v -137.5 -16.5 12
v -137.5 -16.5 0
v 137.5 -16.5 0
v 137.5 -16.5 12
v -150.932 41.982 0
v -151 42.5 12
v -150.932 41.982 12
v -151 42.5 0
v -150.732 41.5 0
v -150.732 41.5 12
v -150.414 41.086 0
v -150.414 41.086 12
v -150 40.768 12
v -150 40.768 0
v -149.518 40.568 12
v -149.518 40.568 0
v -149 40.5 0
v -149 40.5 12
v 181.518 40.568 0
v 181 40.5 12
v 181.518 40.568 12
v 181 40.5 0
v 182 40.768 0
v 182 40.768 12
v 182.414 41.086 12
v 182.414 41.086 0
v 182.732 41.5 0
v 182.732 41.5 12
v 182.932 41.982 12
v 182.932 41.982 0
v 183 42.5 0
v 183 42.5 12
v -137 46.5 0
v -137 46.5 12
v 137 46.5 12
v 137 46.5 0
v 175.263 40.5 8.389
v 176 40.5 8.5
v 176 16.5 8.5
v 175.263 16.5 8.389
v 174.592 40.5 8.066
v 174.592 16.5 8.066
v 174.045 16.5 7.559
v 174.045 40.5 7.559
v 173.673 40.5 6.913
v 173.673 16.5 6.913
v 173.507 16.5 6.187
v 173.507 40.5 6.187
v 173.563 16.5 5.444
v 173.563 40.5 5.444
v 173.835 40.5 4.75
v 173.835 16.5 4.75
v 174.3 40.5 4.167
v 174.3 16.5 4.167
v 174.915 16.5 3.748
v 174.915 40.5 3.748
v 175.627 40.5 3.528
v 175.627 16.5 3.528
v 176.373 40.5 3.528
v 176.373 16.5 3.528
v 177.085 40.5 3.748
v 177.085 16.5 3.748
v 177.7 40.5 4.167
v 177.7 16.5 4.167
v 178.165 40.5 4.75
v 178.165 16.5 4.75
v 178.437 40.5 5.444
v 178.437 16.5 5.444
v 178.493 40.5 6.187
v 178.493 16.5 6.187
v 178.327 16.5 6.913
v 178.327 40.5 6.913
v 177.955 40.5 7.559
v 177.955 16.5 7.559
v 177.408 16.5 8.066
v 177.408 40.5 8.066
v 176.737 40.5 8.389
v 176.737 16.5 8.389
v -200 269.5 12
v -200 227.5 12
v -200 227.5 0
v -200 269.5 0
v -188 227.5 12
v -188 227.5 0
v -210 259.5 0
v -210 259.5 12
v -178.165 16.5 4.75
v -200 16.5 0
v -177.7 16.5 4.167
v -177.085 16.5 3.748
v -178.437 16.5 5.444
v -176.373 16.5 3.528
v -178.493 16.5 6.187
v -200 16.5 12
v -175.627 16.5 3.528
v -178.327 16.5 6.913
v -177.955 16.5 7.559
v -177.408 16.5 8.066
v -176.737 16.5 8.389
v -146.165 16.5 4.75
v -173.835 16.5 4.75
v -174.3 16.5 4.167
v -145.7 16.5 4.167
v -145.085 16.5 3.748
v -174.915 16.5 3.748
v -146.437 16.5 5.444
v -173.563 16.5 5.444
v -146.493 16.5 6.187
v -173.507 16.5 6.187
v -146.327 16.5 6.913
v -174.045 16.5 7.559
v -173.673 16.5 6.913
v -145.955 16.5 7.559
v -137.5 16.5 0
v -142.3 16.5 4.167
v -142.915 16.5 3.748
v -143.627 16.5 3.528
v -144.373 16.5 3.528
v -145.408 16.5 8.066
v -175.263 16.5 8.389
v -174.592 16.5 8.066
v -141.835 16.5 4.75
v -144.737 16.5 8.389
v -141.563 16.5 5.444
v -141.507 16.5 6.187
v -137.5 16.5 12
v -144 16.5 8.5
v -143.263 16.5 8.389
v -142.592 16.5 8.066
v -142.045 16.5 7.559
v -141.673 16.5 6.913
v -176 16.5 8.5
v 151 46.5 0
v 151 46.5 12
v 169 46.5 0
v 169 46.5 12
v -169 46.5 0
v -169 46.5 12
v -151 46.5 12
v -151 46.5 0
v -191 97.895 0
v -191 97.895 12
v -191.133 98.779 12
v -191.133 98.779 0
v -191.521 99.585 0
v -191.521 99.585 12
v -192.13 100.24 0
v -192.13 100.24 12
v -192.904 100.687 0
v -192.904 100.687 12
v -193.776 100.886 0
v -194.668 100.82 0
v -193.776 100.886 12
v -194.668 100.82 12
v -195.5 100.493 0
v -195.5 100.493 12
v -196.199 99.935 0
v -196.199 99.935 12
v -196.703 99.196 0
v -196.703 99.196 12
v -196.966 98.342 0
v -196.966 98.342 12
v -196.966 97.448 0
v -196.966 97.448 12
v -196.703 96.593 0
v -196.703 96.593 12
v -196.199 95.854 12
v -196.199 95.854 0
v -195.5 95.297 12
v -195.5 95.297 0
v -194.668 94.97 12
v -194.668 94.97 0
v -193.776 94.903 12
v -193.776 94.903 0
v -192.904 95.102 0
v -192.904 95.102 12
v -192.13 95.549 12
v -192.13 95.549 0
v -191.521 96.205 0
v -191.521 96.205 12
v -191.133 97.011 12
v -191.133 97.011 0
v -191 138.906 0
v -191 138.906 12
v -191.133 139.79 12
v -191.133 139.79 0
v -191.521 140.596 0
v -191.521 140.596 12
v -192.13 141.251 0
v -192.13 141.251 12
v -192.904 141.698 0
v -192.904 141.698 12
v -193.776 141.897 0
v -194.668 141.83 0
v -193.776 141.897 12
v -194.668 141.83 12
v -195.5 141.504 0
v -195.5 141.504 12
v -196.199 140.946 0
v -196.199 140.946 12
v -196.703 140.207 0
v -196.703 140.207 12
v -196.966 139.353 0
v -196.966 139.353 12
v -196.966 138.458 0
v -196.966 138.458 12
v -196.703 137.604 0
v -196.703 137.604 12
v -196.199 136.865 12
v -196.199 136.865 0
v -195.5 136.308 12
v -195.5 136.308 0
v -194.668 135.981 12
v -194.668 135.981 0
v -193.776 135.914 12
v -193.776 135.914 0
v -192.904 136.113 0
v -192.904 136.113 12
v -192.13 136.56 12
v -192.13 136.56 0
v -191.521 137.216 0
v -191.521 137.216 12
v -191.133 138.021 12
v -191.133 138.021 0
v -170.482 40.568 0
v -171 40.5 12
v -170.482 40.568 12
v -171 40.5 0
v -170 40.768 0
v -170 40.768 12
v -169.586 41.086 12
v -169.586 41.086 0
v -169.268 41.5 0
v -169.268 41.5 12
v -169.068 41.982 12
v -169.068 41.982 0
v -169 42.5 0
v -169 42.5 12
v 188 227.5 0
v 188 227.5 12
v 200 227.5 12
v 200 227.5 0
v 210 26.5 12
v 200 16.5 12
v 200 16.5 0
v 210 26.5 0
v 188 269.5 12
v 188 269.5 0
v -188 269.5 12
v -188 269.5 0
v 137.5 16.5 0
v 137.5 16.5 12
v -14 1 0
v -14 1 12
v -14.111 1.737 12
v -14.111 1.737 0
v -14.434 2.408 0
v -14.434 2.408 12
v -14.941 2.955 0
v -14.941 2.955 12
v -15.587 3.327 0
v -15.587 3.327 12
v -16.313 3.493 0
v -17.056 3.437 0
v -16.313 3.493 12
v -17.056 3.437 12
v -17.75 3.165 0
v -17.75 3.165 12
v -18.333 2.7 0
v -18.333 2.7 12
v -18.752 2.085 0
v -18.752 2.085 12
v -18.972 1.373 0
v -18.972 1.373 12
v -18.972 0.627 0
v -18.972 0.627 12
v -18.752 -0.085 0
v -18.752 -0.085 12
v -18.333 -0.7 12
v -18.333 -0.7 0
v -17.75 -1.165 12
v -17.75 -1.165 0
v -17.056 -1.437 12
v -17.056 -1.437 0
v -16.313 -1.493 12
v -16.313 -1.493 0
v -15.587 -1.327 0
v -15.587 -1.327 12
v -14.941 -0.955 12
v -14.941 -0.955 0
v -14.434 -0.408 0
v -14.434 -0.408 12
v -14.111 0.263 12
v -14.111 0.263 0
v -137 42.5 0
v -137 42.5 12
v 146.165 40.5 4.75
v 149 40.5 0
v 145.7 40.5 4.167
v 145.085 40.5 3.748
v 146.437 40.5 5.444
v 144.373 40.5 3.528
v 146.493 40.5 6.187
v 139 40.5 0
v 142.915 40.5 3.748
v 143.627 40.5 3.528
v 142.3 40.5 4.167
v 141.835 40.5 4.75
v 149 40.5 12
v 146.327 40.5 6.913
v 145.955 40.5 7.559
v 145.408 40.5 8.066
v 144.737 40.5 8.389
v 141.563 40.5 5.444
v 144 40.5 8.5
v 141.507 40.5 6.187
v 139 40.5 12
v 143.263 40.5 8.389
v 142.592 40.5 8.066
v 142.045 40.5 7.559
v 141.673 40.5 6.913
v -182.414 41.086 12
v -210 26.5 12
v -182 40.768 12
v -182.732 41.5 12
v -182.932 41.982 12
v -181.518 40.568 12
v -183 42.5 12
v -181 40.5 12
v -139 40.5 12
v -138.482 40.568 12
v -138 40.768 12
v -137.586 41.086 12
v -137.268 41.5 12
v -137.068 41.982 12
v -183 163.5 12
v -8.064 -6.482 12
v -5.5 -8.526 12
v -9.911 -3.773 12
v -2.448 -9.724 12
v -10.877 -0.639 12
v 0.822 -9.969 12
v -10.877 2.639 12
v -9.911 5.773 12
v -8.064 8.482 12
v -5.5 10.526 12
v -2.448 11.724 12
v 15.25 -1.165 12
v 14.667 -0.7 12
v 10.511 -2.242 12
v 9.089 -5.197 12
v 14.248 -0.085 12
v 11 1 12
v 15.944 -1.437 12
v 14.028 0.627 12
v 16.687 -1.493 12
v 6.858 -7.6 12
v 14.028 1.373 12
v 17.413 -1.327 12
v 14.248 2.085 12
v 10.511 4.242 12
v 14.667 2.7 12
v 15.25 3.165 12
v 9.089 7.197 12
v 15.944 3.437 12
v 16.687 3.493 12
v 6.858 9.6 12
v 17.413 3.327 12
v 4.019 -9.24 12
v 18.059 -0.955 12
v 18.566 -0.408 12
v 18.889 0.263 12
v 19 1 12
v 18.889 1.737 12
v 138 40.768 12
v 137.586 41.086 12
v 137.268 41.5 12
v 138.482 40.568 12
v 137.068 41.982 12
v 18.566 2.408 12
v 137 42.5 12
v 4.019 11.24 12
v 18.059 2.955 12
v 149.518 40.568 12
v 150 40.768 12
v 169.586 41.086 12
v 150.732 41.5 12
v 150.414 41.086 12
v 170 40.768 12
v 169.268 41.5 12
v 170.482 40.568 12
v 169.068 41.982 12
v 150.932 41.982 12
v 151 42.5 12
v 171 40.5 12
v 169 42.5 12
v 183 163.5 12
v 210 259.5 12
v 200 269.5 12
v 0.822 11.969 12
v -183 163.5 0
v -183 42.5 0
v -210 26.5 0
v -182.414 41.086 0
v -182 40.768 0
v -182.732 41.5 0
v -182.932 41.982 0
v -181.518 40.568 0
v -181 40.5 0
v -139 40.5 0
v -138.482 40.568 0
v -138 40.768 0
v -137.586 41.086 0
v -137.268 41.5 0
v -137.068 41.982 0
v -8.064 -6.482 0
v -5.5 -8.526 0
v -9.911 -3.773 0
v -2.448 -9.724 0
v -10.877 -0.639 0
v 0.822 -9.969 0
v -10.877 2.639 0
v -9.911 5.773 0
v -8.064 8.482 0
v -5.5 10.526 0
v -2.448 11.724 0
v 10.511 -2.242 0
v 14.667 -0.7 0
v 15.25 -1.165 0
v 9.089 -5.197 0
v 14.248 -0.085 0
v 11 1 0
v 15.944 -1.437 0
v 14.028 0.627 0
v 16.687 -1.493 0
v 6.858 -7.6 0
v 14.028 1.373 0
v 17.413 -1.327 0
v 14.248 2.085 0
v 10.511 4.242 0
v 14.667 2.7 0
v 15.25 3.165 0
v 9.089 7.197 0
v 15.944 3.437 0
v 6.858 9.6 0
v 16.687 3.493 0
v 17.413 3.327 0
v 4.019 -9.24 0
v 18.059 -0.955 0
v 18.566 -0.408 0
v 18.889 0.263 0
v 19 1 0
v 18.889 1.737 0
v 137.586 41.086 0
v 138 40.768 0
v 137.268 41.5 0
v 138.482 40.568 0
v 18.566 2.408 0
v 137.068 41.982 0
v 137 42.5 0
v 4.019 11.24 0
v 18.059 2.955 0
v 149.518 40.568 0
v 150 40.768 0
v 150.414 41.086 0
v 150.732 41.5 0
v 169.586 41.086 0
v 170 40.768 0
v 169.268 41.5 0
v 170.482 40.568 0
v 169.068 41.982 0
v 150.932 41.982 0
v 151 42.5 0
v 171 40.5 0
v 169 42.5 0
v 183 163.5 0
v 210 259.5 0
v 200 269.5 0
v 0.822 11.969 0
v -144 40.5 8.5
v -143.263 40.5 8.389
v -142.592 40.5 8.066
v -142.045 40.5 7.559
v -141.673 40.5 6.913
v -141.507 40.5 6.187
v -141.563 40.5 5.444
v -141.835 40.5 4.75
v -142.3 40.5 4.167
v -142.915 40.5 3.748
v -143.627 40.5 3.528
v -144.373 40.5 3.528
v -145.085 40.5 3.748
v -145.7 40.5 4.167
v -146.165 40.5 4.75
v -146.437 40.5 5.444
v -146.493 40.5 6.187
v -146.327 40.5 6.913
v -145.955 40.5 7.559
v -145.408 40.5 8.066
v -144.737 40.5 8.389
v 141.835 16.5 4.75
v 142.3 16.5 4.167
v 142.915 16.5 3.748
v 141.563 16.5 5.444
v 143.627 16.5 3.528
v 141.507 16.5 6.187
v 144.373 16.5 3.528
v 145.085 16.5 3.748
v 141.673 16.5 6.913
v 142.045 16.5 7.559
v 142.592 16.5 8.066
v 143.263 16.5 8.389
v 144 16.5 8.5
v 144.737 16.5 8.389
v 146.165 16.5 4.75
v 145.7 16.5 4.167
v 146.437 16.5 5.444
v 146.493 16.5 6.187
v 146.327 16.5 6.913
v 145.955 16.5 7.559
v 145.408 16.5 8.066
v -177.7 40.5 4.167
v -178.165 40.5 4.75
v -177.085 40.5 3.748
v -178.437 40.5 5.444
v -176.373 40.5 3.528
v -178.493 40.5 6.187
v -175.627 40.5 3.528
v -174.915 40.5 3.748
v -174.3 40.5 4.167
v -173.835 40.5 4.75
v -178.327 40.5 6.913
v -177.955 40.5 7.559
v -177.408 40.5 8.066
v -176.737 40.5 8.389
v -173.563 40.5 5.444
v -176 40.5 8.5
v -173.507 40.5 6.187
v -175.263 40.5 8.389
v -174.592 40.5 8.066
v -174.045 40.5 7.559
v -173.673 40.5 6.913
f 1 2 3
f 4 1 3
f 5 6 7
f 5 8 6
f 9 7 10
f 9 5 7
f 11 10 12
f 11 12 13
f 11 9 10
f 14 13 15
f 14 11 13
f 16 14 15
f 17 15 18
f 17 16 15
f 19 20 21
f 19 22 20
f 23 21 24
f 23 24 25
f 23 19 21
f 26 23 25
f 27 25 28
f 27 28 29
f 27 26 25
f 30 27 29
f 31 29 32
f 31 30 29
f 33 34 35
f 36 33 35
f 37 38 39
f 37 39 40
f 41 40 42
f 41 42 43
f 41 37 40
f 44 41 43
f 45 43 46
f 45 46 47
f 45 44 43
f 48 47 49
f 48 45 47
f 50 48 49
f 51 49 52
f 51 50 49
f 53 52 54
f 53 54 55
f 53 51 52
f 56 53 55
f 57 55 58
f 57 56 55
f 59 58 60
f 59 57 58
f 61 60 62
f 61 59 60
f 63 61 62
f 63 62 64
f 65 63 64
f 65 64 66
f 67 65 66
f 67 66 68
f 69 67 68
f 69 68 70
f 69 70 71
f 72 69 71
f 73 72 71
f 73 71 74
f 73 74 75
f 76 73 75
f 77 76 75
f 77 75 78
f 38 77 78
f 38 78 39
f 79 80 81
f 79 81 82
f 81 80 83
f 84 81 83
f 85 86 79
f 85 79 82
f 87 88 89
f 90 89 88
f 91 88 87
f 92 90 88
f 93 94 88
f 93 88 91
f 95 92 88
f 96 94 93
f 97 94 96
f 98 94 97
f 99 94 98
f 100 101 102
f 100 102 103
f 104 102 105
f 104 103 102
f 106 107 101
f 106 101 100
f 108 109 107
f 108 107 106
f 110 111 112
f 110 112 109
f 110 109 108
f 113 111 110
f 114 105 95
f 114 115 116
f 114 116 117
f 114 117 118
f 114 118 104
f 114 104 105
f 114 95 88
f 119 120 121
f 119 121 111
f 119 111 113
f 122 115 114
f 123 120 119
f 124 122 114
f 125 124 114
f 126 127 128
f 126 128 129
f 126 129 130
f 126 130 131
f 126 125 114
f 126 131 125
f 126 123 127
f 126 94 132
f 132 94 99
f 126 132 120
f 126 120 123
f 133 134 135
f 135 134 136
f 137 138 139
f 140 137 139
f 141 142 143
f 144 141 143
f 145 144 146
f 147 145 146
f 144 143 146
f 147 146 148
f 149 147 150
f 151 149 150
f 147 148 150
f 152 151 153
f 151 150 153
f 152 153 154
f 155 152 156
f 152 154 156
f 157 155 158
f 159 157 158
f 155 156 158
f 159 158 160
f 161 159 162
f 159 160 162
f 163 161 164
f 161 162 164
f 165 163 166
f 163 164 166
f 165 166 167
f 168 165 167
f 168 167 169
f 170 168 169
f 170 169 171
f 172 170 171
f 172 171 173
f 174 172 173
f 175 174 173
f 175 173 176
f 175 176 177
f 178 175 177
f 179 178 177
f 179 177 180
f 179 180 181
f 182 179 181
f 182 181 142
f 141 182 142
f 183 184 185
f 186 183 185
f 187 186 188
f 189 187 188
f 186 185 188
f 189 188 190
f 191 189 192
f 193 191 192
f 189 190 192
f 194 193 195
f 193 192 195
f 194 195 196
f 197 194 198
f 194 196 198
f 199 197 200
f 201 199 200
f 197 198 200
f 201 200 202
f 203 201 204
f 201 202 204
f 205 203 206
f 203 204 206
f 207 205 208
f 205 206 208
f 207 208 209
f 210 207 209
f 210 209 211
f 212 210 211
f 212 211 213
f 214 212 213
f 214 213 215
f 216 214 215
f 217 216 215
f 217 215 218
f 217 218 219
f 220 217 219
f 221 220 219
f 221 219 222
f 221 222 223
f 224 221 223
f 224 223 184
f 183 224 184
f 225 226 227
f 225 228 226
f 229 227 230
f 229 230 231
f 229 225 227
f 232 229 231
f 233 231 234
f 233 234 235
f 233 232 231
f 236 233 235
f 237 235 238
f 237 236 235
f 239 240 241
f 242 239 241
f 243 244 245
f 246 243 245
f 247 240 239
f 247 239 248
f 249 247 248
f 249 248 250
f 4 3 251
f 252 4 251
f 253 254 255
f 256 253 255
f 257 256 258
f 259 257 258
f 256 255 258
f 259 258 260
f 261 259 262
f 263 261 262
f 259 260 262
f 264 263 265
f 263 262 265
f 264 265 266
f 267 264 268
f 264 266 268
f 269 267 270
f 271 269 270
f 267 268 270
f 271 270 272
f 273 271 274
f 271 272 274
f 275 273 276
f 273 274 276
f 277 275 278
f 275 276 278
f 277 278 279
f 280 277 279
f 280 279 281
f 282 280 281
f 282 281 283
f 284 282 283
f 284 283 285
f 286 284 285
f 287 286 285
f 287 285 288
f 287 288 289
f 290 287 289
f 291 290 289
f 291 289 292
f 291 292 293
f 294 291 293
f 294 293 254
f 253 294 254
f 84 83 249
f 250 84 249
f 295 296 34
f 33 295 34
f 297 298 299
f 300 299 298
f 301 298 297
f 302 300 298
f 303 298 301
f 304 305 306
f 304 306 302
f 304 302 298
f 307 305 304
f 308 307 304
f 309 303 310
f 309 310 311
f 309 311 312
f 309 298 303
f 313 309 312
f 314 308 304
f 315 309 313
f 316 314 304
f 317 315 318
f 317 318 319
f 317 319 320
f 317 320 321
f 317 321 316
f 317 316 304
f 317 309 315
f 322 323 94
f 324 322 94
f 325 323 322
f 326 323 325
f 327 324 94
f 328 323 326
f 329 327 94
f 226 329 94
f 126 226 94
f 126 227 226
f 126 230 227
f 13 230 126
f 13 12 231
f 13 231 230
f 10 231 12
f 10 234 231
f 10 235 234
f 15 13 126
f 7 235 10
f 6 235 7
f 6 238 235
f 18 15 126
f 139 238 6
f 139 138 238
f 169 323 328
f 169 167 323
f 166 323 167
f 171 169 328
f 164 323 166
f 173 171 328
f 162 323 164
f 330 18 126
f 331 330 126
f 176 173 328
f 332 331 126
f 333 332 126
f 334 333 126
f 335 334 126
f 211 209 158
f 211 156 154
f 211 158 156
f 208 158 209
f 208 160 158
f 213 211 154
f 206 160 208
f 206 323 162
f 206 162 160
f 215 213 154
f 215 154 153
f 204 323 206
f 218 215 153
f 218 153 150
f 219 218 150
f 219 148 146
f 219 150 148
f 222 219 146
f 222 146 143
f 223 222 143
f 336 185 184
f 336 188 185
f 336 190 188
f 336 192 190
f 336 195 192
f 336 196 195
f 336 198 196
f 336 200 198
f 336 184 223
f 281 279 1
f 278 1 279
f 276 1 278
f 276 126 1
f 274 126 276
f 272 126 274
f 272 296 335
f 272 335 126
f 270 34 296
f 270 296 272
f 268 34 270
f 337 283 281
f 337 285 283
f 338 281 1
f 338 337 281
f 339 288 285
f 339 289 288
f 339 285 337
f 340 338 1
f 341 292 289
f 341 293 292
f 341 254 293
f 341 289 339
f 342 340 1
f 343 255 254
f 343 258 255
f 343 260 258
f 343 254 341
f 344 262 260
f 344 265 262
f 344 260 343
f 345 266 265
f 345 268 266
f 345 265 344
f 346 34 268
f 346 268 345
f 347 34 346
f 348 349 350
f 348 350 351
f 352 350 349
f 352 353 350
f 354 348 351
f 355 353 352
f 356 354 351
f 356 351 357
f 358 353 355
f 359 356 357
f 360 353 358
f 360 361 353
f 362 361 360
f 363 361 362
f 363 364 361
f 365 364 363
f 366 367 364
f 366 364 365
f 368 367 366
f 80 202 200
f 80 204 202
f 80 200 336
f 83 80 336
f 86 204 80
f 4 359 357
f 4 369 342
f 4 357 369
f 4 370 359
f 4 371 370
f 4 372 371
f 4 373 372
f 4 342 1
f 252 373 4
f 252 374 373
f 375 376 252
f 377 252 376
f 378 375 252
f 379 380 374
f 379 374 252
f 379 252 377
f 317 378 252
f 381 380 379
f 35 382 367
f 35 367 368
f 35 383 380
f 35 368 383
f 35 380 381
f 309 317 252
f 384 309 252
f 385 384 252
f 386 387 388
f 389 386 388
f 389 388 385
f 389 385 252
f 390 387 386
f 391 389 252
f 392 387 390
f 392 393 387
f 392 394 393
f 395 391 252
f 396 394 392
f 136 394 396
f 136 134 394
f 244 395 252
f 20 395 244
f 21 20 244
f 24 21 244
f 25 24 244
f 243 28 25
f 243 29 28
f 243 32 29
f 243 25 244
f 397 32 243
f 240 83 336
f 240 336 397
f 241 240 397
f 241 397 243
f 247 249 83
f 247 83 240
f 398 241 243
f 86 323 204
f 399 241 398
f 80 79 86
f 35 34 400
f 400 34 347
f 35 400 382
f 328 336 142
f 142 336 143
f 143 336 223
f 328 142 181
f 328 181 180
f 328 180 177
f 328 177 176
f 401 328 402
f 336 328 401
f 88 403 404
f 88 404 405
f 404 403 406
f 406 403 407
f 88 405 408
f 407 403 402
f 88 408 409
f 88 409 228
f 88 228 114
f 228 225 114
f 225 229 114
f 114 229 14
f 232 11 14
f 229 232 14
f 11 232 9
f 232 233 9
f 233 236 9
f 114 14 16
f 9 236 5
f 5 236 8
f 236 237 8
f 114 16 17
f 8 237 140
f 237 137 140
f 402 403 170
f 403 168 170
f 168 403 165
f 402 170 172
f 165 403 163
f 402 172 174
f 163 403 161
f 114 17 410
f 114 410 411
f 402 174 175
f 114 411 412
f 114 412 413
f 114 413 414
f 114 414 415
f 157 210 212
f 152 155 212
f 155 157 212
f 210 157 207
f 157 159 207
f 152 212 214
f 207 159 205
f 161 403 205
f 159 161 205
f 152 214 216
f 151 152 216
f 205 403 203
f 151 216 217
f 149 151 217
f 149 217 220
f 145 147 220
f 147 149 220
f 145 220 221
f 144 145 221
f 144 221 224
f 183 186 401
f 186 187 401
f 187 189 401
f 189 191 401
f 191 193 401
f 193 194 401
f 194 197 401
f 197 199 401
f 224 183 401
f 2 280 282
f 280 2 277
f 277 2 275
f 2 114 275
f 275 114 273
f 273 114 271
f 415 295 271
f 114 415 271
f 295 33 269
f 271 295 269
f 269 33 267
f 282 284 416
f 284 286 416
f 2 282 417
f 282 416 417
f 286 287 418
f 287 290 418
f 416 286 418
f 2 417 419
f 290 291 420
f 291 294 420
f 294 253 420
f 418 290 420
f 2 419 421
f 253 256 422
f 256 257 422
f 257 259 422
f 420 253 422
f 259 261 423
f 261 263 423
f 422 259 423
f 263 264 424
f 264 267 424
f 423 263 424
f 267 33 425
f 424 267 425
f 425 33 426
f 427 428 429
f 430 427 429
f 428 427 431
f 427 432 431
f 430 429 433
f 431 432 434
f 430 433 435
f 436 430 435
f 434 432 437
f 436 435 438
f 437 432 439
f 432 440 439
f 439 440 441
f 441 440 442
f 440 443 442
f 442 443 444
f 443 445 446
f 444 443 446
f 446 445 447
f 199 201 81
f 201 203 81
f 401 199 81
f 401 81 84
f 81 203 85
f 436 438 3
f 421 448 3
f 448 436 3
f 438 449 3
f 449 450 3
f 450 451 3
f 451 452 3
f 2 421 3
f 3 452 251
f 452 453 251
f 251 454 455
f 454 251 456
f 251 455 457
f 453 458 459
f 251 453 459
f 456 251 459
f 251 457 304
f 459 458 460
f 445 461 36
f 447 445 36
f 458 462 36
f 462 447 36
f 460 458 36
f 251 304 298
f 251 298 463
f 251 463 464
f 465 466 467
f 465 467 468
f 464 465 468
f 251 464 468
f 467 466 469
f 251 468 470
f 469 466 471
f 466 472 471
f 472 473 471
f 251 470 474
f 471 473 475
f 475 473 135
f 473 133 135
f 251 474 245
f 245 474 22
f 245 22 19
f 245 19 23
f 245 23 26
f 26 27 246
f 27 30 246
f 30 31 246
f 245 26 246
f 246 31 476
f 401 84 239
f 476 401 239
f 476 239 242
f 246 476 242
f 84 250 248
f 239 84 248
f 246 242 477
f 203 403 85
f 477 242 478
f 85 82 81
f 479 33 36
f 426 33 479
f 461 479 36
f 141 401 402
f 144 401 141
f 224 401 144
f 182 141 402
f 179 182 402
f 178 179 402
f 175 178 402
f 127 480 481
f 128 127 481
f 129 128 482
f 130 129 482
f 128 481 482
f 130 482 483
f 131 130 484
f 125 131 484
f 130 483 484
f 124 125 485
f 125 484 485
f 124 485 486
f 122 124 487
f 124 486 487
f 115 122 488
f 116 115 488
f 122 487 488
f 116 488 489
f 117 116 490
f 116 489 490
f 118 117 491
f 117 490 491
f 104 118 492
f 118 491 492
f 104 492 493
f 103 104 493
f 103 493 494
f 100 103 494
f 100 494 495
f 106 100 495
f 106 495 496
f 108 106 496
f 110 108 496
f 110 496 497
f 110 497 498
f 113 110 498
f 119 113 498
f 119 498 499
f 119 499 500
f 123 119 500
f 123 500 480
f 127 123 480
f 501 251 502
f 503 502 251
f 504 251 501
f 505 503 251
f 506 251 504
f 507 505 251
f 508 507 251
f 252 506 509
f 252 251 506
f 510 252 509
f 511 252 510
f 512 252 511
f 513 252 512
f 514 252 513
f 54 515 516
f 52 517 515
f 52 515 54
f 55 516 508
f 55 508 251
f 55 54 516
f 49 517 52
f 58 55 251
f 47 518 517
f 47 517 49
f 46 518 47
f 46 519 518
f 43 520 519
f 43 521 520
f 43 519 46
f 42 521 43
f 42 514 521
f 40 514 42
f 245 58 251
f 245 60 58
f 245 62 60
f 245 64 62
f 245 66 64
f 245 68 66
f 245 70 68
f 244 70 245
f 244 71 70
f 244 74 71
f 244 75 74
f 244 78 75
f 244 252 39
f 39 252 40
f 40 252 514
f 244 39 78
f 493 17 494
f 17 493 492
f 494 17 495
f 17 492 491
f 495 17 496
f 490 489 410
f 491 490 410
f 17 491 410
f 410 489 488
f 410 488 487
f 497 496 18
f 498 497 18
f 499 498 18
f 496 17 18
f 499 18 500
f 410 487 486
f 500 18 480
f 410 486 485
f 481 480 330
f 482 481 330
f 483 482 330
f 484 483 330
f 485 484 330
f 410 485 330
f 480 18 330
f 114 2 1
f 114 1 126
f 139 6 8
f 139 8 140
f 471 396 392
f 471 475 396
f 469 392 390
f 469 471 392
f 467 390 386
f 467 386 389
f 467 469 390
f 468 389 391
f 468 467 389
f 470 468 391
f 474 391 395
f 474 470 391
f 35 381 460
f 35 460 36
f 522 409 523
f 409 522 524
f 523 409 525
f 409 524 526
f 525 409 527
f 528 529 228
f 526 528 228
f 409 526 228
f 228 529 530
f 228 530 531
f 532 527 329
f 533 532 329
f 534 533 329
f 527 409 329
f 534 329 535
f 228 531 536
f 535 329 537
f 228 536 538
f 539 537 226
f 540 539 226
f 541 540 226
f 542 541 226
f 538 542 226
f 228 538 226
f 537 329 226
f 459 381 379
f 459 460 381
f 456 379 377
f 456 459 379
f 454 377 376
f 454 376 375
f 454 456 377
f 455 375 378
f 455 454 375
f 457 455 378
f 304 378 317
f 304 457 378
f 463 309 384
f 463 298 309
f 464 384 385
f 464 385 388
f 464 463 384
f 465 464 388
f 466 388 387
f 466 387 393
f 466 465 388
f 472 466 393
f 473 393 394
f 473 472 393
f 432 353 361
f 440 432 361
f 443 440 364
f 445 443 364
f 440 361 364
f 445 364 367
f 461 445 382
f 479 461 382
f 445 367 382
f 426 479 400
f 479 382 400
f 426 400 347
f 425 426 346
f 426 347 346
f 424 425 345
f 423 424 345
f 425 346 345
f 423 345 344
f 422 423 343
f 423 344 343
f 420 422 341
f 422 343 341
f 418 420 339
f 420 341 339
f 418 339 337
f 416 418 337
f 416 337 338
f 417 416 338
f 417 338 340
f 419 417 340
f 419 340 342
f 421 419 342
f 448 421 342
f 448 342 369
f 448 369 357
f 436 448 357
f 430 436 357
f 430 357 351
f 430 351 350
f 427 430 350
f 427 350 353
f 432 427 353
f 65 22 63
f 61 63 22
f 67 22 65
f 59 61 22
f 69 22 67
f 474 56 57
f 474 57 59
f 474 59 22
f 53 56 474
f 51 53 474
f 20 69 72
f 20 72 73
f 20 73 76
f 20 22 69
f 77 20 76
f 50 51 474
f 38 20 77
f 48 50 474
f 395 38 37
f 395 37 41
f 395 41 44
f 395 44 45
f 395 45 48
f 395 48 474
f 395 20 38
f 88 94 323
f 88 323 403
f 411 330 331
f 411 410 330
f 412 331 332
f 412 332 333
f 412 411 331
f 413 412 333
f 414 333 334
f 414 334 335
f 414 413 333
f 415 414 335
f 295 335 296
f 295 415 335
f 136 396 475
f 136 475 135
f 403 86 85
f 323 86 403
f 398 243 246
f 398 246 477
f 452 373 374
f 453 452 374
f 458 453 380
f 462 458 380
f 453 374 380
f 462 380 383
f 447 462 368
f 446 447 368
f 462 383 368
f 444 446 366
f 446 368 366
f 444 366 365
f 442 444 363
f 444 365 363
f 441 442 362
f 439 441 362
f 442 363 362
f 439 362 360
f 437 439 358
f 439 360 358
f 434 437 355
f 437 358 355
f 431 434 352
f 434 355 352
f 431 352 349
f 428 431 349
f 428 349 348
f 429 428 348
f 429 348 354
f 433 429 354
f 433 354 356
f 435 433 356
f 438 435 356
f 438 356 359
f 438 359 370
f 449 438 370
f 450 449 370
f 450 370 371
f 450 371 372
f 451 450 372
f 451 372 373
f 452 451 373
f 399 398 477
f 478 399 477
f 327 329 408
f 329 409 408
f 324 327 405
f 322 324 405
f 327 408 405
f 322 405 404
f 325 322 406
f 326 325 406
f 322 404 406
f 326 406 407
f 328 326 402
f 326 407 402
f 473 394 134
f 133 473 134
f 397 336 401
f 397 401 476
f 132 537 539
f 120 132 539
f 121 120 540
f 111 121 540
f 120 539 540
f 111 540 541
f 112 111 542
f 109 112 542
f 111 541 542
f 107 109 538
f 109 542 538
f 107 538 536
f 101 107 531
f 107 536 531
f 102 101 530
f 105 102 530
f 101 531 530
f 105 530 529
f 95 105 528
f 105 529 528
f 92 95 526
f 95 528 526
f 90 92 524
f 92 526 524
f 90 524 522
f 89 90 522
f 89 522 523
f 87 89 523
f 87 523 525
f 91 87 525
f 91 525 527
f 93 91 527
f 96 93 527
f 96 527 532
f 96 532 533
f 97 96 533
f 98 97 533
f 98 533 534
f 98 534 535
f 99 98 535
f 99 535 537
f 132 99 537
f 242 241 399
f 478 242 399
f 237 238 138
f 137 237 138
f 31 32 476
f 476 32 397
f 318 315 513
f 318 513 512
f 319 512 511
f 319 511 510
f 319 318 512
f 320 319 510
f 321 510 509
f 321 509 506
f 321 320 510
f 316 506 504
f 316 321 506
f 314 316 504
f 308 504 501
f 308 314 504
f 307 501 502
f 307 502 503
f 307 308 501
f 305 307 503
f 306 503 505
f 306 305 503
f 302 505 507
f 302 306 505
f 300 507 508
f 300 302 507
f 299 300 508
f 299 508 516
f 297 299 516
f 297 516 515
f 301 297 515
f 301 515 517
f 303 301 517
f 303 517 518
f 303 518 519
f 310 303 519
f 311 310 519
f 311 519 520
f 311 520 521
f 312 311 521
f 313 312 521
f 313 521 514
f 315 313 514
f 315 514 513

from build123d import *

# Parameters (mm, degrees)
SKETCH1_W            = 275
SKETCH1_H            = 33
BOSS_EXTRUDE1_DEPTH  = 12
CUT_EXTRUDE1_REACH   = 141.005
SKETCH2_R            = 11
SKETCH2_R_2          = 2.5
SKETCH3_W            = 366
SKETCH3_H            = 117
BOSS_EXTRUDE2_DEPTH  = 12
CUT_EXTRUDE2_REACH   = 308.55
SKETCH4_R            = 2.5
CUT_EXTRUDE3_REACH   = 343.869
SKETCH5_W            = 14
SKETCH5_H            = 6
FILLET1_R            = 2
FILLET1_OF_MIRROR2_R = 2
CHAMFER1_SIZE        = 10
CUT_EXTRUDE4_REACH   = 343.869
SKETCH6_R            = 3
CUT_EXTRUDE6_REACH   = 343.869
SKETCH8_W            = 12
SKETCH8_H            = 42
CHAMFER2_SIZE        = 10


with BuildPart() as part:
    # Sketch1 → Boss-Extrude1 (new body)
    with BuildSketch(Plane.XY):
        Rectangle(SKETCH1_W, SKETCH1_H)
    extrude(amount=BOSS_EXTRUDE1_DEPTH)

    # Sketch2 → Cut-Extrude1 (cut, up to next)
    with BuildSketch(Plane.XY.offset(12), mode=Mode.PRIVATE) as cut_extrude1_sk1:
        with Locations((0, 1)):
            Circle(SKETCH2_R)
    cut_extrude1_tool1 = extrude(cut_extrude1_sk1.sketch, amount=-CUT_EXTRUDE1_REACH, mode=Mode.PRIVATE) & part.part
    # Sketch2 → Cut-Extrude1 (cut, up to next)
    with BuildSketch(Plane.XY.offset(12), mode=Mode.PRIVATE) as cut_extrude1_sk2:
        with Locations((-16.5, 1)):
            Circle(SKETCH2_R_2)
    cut_extrude1_tool2 = extrude(cut_extrude1_sk2.sketch, amount=-CUT_EXTRUDE1_REACH, mode=Mode.PRIVATE) & part.part
    # Sketch2 → Cut-Extrude1 (cut, up to next)
    with BuildSketch(Plane.XY.offset(12), mode=Mode.PRIVATE) as cut_extrude1_sk3:
        with Locations((16.5, 1)):
            Circle(SKETCH2_R_2)
    cut_extrude1_tool3 = extrude(cut_extrude1_sk3.sketch, amount=-CUT_EXTRUDE1_REACH, mode=Mode.PRIVATE) & part.part
    add(cut_extrude1_tool1.solids().sort_by_distance((0, 1, 12))[0], mode=Mode.SUBTRACT)
    add(cut_extrude1_tool2.solids().sort_by_distance((-16.5, 1, 12))[0], mode=Mode.SUBTRACT)
    add(cut_extrude1_tool3.solids().sort_by_distance((16.5, 1, 12))[0], mode=Mode.SUBTRACT)

    # Sketch3 → Boss-Extrude2 (add)
    with BuildSketch(Plane.XY.offset(12)):
        Polygon((-210, 16.5), (210, 16.5), (210, 46.5), (210, 269.5), (-210, 269.5), (-210, 46.5), align=None)
        with Locations((0, 105)):
            Rectangle(SKETCH3_W, SKETCH3_H, mode=Mode.SUBTRACT)
    extrude(amount=-BOSS_EXTRUDE2_DEPTH)

    # Sketch4 → Cut-Extrude2 (cut, up to next)
    with BuildSketch(Plane(origin=(0, 46.5, 0), x_dir=(1, 0, 0), z_dir=(0, 1, 0)), mode=Mode.PRIVATE) as cut_extrude2_sk1:
        with Locations(Location((-144, -6, 0), (0, 0, 270))):
            Circle(SKETCH4_R)
    cut_extrude2_tool1 = extrude(cut_extrude2_sk1.sketch, amount=-CUT_EXTRUDE2_REACH, mode=Mode.PRIVATE) & part.part
    # Sketch4 → Cut-Extrude2 (cut, up to next)
    with BuildSketch(Plane(origin=(0, 46.5, 0), x_dir=(1, 0, 0), z_dir=(0, 1, 0)), mode=Mode.PRIVATE) as cut_extrude2_sk2:
        with Locations(Location((-176, -6, 0), (0, 0, 270))):
            Circle(SKETCH4_R)
    cut_extrude2_tool2 = extrude(cut_extrude2_sk2.sketch, amount=-CUT_EXTRUDE2_REACH, mode=Mode.PRIVATE) & part.part
    cut_extrude2_1 = cut_extrude2_tool1.solids().sort_by_distance((-144, 46.5, 6))[0]
    add(cut_extrude2_1, mode=Mode.SUBTRACT)
    cut_extrude2_2 = cut_extrude2_tool2.solids().sort_by_distance((-176, 46.5, 6))[0]
    add(cut_extrude2_2, mode=Mode.SUBTRACT)
    cut_extrude2 = cut_extrude2_1 + cut_extrude2_2  # Cut-Extrude2 as one shape, for the pattern or mirror that repeats it

    # Mirror1: Cut-Extrude2 across plane
    add(cut_extrude2.mirror(Plane(origin=(0, 0, 0), x_dir=(0, 0, 1), z_dir=(1, 0, 0))), mode=Mode.SUBTRACT)

    # Sketch5 → Cut-Extrude3 (cut, up to next)
    with BuildSketch(Plane.XY.offset(12), mode=Mode.PRIVATE) as cut_extrude3_sk1:
        with Locations((-176, 43.5)):
            Rectangle(SKETCH5_W, SKETCH5_H)
    cut_extrude3_tool1 = extrude(cut_extrude3_sk1.sketch, amount=-CUT_EXTRUDE3_REACH, mode=Mode.PRIVATE) & part.part
    # Sketch5 → Cut-Extrude3 (cut, up to next)
    with BuildSketch(Plane.XY.offset(12), mode=Mode.PRIVATE) as cut_extrude3_sk2:
        with Locations((-144, 43.5)):
            Rectangle(SKETCH5_W, SKETCH5_H)
    cut_extrude3_tool2 = extrude(cut_extrude3_sk2.sketch, amount=-CUT_EXTRUDE3_REACH, mode=Mode.PRIVATE) & part.part
    cut_extrude3_1 = cut_extrude3_tool1.solids().sort_by_distance((-176, 43.5, 12))[0]
    add(cut_extrude3_1, mode=Mode.SUBTRACT)
    cut_extrude3_2 = cut_extrude3_tool2.solids().sort_by_distance((-144, 43.5, 12))[0]
    add(cut_extrude3_2, mode=Mode.SUBTRACT)
    cut_extrude3 = cut_extrude3_1 + cut_extrude3_2  # Cut-Extrude3 as one shape, for the pattern or mirror that repeats it

    # Fillet1
    fillet1_edges = [part.edges().sort_by_distance(p)[0] for p in [
        (-169, 40.5, 6),
        (-183, 40.5, 6),
        (-137, 40.5, 6),
        (-151, 40.5, 6),
    ]]
    fillet(fillet1_edges, radius=FILLET1_R)

    # Mirror2: Cut-Extrude3 across plane
    add(cut_extrude3.mirror(Plane(origin=(0, 0, 0), x_dir=(0, 0, 1), z_dir=(1, 0, 0))), mode=Mode.SUBTRACT)

    # Fillet1 of Mirror2
    fillet1_of_mirror2_edges = [part.edges().sort_by_distance(p)[0] for p in [
        (169, 40.5, 6),
        (183, 40.5, 6),
        (137, 40.5, 6),
        (151, 40.5, 6),
    ]]
    fillet(fillet1_of_mirror2_edges, radius=FILLET1_OF_MIRROR2_R)

    # Chamfer1
    chamfer1_edges = [part.edges().sort_by_distance(p)[0] for p in [
        (210, 16.5, 6),
        (-210, 16.5, 6),
    ]]
    chamfer(chamfer1_edges, length=CHAMFER1_SIZE)

    # Sketch6 → Cut-Extrude4 (cut, up to next)
    with BuildSketch(Plane.XY.offset(12), mode=Mode.PRIVATE) as cut_extrude4_sk1:
        with Locations((-194, 138.905602013)):
            Circle(SKETCH6_R)
    cut_extrude4_tool1 = extrude(cut_extrude4_sk1.sketch, amount=-CUT_EXTRUDE4_REACH, mode=Mode.PRIVATE) & part.part
    # Sketch6 → Cut-Extrude4 (cut, up to next)
    with BuildSketch(Plane.XY.offset(12), mode=Mode.PRIVATE) as cut_extrude4_sk2:
        with Locations((-194, 97.894768826)):
            Circle(SKETCH6_R)
    cut_extrude4_tool2 = extrude(cut_extrude4_sk2.sketch, amount=-CUT_EXTRUDE4_REACH, mode=Mode.PRIVATE) & part.part
    add(cut_extrude4_tool1.solids().sort_by_distance((-194, 138.905602, 12))[0], mode=Mode.SUBTRACT)
    add(cut_extrude4_tool2.solids().sort_by_distance((-194, 97.894769, 12))[0], mode=Mode.SUBTRACT)

    # Sketch8 → Cut-Extrude6 (cut, up to next)
    with BuildSketch(Plane.XY.offset(12), mode=Mode.PRIVATE) as cut_extrude6_sk1:
        with Locations((-194, 248.5)):
            Rectangle(SKETCH8_W, SKETCH8_H)
    cut_extrude6_tool1 = extrude(cut_extrude6_sk1.sketch, amount=-CUT_EXTRUDE6_REACH, mode=Mode.PRIVATE) & part.part
    # Sketch8 → Cut-Extrude6 (cut, up to next)
    with BuildSketch(Plane.XY.offset(12), mode=Mode.PRIVATE) as cut_extrude6_sk2:
        with Locations((194, 248.5)):
            Rectangle(SKETCH8_W, SKETCH8_H)
    cut_extrude6_tool2 = extrude(cut_extrude6_sk2.sketch, amount=-CUT_EXTRUDE6_REACH, mode=Mode.PRIVATE) & part.part
    add(cut_extrude6_tool1.solids().sort_by_distance((-194, 248.5, 12))[0], mode=Mode.SUBTRACT)
    add(cut_extrude6_tool2.solids().sort_by_distance((194, 248.5, 12))[0], mode=Mode.SUBTRACT)

    # Chamfer2
    chamfer2_edges = [part.edges().sort_by_distance(p)[0] for p in [
        (210, 269.5, 6),
        (-210, 269.5, 6),
    ]]
    chamfer(chamfer2_edges, length=CHAMFER2_SIZE - 0.0001)  # a hair under: the kernel refuses the full size


solid = part.part
